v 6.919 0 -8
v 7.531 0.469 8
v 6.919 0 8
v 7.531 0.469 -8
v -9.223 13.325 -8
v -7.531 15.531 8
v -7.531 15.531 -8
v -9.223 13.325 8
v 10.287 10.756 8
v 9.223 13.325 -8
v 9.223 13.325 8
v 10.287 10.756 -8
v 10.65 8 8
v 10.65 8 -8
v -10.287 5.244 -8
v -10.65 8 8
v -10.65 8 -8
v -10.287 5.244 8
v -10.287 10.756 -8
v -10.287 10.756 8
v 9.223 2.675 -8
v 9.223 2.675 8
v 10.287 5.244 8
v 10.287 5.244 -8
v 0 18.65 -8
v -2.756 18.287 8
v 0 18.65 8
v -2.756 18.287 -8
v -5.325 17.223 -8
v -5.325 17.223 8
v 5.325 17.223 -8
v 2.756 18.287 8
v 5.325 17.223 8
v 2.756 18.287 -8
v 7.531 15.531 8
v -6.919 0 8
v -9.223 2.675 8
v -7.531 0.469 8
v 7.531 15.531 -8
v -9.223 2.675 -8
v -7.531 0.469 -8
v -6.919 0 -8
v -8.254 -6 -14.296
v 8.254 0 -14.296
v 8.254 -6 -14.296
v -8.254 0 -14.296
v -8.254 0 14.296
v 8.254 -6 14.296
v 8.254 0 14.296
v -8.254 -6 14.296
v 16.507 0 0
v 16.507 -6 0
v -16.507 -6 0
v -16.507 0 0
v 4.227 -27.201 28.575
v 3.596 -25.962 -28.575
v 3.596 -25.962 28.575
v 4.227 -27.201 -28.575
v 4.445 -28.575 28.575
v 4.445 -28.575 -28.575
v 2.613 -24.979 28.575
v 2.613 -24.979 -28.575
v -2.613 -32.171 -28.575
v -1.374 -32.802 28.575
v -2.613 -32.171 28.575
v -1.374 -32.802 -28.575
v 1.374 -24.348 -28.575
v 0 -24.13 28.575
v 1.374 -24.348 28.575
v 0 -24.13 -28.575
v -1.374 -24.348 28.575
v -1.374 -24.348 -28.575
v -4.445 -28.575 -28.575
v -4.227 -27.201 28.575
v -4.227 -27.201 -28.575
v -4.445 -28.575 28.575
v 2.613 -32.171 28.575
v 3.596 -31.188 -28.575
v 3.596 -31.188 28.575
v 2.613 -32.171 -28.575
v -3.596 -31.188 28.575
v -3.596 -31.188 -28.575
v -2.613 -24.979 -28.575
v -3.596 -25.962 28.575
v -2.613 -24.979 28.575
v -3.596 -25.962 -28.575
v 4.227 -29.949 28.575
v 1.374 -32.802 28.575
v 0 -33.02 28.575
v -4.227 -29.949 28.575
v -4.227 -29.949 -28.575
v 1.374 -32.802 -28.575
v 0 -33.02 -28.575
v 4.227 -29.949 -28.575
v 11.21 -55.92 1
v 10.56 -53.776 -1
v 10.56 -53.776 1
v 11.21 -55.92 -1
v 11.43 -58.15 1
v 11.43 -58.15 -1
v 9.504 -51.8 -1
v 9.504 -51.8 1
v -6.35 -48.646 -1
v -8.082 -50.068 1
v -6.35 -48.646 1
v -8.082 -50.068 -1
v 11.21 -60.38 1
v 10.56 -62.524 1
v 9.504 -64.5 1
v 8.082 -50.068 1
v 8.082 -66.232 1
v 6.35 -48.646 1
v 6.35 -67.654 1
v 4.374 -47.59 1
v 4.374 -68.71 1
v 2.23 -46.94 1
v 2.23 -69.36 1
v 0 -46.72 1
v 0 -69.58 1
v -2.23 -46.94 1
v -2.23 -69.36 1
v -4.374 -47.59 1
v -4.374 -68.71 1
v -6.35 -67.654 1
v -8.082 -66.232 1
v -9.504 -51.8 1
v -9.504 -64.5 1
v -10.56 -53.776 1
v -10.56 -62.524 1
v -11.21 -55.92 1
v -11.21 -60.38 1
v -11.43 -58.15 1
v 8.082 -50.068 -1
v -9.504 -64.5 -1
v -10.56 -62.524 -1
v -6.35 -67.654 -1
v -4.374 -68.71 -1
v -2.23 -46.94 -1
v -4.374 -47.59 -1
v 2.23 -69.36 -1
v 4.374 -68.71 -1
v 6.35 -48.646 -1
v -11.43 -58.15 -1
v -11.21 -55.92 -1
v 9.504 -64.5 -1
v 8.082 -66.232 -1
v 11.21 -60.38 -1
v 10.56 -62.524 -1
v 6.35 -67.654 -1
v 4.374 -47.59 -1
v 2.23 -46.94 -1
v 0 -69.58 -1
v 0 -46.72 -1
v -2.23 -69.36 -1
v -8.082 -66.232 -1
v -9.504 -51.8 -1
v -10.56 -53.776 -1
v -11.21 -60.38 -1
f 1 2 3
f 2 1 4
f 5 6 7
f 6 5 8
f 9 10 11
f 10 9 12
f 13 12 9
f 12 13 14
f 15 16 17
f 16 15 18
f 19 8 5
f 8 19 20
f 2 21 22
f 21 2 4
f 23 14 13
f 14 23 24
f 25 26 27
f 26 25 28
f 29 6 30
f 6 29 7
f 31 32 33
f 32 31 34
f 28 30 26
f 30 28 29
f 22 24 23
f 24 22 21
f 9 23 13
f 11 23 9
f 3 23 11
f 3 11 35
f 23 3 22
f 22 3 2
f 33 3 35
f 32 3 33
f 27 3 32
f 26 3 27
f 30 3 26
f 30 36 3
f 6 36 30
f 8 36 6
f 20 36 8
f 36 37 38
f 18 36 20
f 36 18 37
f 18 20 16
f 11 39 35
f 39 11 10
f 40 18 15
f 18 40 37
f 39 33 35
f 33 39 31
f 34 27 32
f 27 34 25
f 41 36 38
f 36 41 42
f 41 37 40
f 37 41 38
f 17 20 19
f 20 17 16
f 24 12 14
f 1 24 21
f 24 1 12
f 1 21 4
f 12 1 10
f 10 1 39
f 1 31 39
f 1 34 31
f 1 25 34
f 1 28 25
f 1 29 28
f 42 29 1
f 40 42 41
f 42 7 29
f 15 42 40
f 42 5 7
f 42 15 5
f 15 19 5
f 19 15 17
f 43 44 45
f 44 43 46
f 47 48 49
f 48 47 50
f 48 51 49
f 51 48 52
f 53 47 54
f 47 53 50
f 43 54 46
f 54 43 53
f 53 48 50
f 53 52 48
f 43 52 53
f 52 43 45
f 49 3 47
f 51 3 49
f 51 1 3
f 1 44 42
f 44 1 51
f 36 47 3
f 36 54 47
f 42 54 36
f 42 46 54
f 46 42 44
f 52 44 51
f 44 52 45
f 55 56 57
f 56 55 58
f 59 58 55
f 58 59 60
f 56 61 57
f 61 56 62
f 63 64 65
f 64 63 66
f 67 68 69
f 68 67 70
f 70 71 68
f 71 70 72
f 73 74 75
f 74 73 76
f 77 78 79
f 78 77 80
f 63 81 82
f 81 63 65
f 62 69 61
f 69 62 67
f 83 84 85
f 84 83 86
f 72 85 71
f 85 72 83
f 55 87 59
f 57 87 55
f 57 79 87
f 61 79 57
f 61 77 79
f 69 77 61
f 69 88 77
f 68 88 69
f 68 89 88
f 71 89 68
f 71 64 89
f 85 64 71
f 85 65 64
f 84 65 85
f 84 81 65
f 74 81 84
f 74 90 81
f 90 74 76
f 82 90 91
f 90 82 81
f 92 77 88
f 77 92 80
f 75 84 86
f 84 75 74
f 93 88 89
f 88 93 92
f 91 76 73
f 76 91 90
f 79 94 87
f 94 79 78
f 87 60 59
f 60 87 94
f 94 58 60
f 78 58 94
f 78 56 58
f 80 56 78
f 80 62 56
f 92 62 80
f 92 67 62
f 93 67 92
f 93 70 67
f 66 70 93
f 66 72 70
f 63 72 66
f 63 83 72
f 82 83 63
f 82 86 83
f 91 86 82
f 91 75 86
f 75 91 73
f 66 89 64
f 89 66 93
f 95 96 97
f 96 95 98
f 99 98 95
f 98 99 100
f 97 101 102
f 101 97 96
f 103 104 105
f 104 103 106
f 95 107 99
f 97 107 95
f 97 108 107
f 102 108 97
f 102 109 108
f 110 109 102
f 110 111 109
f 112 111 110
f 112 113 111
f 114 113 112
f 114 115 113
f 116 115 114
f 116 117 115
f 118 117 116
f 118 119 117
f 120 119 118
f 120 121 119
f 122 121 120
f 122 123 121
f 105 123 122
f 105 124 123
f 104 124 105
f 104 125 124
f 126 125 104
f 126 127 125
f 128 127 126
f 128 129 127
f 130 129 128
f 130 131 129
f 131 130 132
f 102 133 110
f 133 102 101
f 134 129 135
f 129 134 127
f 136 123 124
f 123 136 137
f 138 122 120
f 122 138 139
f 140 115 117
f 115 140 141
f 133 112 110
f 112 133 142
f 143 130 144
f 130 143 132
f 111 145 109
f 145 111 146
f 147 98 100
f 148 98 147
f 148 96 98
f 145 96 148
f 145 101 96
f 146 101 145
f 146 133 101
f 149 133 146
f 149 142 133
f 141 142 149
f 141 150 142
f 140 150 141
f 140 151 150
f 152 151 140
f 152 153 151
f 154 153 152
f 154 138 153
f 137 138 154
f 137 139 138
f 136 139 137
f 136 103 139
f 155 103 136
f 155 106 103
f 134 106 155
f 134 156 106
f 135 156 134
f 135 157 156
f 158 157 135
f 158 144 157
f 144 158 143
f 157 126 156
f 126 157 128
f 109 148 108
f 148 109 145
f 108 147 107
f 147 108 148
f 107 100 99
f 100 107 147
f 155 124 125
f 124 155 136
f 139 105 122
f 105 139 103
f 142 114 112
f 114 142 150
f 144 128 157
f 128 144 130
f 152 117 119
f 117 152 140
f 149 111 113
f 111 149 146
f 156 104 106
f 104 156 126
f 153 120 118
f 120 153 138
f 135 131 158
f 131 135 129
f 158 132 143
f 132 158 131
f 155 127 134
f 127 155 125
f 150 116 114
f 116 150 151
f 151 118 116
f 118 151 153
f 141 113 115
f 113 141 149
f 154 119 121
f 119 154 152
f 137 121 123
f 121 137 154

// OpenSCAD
// Auto-generated by scripts/author_from_manifest.py (Phase D.3).
// Source: data/phase_d_manifest.json (sku_intent='tyco-ec11-pendent-k112-175f').
// Do not hand-edit — regenerate from the manifest.
//
// @part tyco_ec11_pendent_k112_175f
// @kind sprinkler_head
// @category head.pendant.k112
// @display-name "Tyco EC-11 Extended Coverage Pendent K11.2 175°F"
// @mfg tyco_fire_protection
// @mfg-pn EC-11
// @listing UL FM
// @hazard-classes OH1 OH2
// @price-usd 34.00
// @install-minutes 10
// @crew journeyman
// @k-factor 11.2
// @orientation pendant
// @response standard
// @temperature 175F
// @param size_in number default=0.5 label="Size" unit="in"
// @port inlet position=[0,0.014,0] direction=[0,1,0] style=NPT_threaded size_in=0.75 role=drop

size_in = 0.5;
k_factor = 11.2;

length_mm   = 57.15;
body_dia_mm = 25.40;
thread_od   = 21.3;
thread_len  = 16;
deflector_d = body_dia_mm * 0.9;

 union() {
    translate([0, thread_len/2, 0])
        cylinder(h = thread_len, d = thread_od, center = true, $fn = 24);
    translate([0, -3, 0])
        rotate([90, 0, 0])
        cylinder(h = 6, d = thread_od * 1.55, $fn = 6, center = true);
    translate([0, -length_mm/2, 0])
        cylinder(h = length_mm, d = body_dia_mm * 0.35, center = true, $fn = 20);
    translate([0, -length_mm - 1, 0])
        cylinder(h = 2, d = deflector_d, center = true, $fn = 32);
}
